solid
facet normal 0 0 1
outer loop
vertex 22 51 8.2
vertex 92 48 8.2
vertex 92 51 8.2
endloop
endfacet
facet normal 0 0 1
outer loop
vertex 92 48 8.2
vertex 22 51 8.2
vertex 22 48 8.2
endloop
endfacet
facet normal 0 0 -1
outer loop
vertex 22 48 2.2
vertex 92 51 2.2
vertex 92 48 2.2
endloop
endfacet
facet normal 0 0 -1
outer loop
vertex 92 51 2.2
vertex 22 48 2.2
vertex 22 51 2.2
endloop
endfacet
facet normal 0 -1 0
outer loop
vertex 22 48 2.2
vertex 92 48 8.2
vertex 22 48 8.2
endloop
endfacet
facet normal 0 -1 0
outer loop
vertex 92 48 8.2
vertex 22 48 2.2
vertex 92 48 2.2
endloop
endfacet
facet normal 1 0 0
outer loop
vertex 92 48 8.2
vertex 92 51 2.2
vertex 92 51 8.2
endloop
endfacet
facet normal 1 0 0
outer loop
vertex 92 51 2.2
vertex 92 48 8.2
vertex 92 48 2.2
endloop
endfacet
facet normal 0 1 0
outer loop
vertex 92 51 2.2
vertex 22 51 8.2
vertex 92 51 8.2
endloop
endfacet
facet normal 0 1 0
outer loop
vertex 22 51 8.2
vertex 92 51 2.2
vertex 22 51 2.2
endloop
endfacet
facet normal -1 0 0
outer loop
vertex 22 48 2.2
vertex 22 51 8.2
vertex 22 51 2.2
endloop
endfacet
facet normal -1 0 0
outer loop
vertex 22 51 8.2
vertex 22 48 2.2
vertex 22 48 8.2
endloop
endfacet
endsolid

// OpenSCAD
// =============================================================================
// Wake 睡眠环境守夜盒 · MVP 极速单件敞口收纳斗 (Open-Top Prototype Caddy)
// 设计者: 刘航成 & 夏工 & Antigravity
// 特点: 
//   1. 单件一体成型，无顶盖、零装配公差，拓竹打印 100% 成功。
//   2. 前低后高斜切口：前壁低矮不挡屏、不硌手，后壁支撑开发板。
//   3. 面包板与杜邦线直接插在敞口内，现场秒级排障免拆螺丝。
//   4. 四周侧壁各放一个传感器：前PIR、后灯环、左温感、右光敏。
// =============================================================================

$fn = 60;

// 外轮廓尺寸 (适配常见 400孔长面包板或 170孔小面包板)
box_w = 114;      // 宽度
box_d = 96;       // 深度
h_front = 24;     // 前壁高度 (低矮不挡视线)
h_rear = 58;      // 后壁高度 (支撑开发板与灯环)
wall = 2.2;       // 壁厚 (拓竹 0.4 喷嘴恰好 5 道整墙，极结实)

// 传感器开孔参数
pir_d = 12.5;     // AM412 PIR 探头直径
bh1750_d = 5.0;   // BH1750 光敏采光孔
ws2812_ring_od = 32.5; // WS2812 8位灯环外径
ws2812_ring_id = 17.5; // WS2812 内圈透光孔

open_mvp_caddy();

module open_mvp_caddy() {
    difference() {
        // 1. 外轮廓放样斜口体 (前低后高)
        polyhedron(
            points = [
                // 底面 4 点 (z=0)
                [0, 0, 0],          // 0: 前左底
                [box_w, 0, 0],      // 1: 前右底
                [box_w, box_d, 0],  // 2: 后右底
                [0, box_d, 0],      // 3: 后左底
                // 顶沿 4 点 (前高 24, 后高 58)
                [0, 0, h_front],          // 4: 前左顶
                [box_w, 0, h_front],      // 5: 前右顶
                [box_w, box_d, h_rear],   // 6: 后右顶
                [0, box_d, h_rear]        // 7: 后左顶
            ],
            faces = [
                [0, 1, 2, 3],       // 底
                [0, 4, 5, 1],       // 前壁
                [1, 5, 6, 2],       // 右壁 (斜边)
                [2, 6, 7, 3],       // 后壁 (高壁)
                [3, 7, 4, 0]        // 左壁 (斜边)
                // 顶口开放，无顶盖！
            ]
        );

        // 2. 内部彻底掏空 (留下 wall 壁厚，形成敞口大内胆)
        translate([wall, wall, wall])
            polyhedron(
                points = [
                    [0, 0, 0],
                    [box_w - 2*wall, 0, 0],
                    [box_w - 2*wall, box_d - 2*wall, 0],
                    [0, box_d - 2*wall, 0],
                    [0, 0, h_front],
                    [box_w - 2*wall, 0, h_front],
                    [box_w - 2*wall, box_d - 2*wall, h_rear],
                    [0, box_d - 2*wall, h_rear]
                ],
                faces = [
                    [0, 1, 2, 3],
                    [0, 4, 5, 1],
                    [1, 5, 6, 2],
                    [2, 6, 7, 3],
                    [3, 7, 4, 0]
                ]
            );

        // 3. 【正前壁开孔】AM412 PIR 人体红外圆球视窗 (居中或偏右)
        translate([box_w / 2, -0.1, h_front / 2 + 2])
            rotate([-90, 0, 0])
                cylinder(d = pir_d, h = wall + 0.2);

        // 4. 【后背高壁开孔】WS2812 8位灯环沉孔 (朝后墙打柔和漫反射环境光)
        translate([box_w / 2, box_d - wall - 0.1, h_rear - 24])
            rotate([-90, 0, 0])
                cylinder(d = ws2812_ring_od, h = wall + 0.2);

        // 5. 【后背出线槽】Type-C 供电/烧录线插口
        translate([20, box_d - wall - 0.1, wall + 2])
            cube([14, wall + 0.2, 8]);

        // 6. 【左侧壁百叶窗】SPA06 气压温度对流通风百叶
        for (i = [0:4]) {
            translate([-0.1, 25 + i*8, wall + 3])
                cube([wall + 0.2, 4.5, 9]);
        }

        // 7. 【右侧壁开孔】BH1750 环境光敏采光孔
        translate([box_w - wall - 0.1, 40, h_front + 8])
            rotate([0, 90, 0])
                cylinder(d = bh1750_d, h = wall + 0.2);
    }

    // 8. 内部开发板倾斜倚靠卡槽 (让 ESP32-S3 屏幕斜靠在后方，面向敞口)
    translate([box_w / 2 - 35, 48, wall])
        cube([70, 3, 6]); // 底部防滑挡条
}
